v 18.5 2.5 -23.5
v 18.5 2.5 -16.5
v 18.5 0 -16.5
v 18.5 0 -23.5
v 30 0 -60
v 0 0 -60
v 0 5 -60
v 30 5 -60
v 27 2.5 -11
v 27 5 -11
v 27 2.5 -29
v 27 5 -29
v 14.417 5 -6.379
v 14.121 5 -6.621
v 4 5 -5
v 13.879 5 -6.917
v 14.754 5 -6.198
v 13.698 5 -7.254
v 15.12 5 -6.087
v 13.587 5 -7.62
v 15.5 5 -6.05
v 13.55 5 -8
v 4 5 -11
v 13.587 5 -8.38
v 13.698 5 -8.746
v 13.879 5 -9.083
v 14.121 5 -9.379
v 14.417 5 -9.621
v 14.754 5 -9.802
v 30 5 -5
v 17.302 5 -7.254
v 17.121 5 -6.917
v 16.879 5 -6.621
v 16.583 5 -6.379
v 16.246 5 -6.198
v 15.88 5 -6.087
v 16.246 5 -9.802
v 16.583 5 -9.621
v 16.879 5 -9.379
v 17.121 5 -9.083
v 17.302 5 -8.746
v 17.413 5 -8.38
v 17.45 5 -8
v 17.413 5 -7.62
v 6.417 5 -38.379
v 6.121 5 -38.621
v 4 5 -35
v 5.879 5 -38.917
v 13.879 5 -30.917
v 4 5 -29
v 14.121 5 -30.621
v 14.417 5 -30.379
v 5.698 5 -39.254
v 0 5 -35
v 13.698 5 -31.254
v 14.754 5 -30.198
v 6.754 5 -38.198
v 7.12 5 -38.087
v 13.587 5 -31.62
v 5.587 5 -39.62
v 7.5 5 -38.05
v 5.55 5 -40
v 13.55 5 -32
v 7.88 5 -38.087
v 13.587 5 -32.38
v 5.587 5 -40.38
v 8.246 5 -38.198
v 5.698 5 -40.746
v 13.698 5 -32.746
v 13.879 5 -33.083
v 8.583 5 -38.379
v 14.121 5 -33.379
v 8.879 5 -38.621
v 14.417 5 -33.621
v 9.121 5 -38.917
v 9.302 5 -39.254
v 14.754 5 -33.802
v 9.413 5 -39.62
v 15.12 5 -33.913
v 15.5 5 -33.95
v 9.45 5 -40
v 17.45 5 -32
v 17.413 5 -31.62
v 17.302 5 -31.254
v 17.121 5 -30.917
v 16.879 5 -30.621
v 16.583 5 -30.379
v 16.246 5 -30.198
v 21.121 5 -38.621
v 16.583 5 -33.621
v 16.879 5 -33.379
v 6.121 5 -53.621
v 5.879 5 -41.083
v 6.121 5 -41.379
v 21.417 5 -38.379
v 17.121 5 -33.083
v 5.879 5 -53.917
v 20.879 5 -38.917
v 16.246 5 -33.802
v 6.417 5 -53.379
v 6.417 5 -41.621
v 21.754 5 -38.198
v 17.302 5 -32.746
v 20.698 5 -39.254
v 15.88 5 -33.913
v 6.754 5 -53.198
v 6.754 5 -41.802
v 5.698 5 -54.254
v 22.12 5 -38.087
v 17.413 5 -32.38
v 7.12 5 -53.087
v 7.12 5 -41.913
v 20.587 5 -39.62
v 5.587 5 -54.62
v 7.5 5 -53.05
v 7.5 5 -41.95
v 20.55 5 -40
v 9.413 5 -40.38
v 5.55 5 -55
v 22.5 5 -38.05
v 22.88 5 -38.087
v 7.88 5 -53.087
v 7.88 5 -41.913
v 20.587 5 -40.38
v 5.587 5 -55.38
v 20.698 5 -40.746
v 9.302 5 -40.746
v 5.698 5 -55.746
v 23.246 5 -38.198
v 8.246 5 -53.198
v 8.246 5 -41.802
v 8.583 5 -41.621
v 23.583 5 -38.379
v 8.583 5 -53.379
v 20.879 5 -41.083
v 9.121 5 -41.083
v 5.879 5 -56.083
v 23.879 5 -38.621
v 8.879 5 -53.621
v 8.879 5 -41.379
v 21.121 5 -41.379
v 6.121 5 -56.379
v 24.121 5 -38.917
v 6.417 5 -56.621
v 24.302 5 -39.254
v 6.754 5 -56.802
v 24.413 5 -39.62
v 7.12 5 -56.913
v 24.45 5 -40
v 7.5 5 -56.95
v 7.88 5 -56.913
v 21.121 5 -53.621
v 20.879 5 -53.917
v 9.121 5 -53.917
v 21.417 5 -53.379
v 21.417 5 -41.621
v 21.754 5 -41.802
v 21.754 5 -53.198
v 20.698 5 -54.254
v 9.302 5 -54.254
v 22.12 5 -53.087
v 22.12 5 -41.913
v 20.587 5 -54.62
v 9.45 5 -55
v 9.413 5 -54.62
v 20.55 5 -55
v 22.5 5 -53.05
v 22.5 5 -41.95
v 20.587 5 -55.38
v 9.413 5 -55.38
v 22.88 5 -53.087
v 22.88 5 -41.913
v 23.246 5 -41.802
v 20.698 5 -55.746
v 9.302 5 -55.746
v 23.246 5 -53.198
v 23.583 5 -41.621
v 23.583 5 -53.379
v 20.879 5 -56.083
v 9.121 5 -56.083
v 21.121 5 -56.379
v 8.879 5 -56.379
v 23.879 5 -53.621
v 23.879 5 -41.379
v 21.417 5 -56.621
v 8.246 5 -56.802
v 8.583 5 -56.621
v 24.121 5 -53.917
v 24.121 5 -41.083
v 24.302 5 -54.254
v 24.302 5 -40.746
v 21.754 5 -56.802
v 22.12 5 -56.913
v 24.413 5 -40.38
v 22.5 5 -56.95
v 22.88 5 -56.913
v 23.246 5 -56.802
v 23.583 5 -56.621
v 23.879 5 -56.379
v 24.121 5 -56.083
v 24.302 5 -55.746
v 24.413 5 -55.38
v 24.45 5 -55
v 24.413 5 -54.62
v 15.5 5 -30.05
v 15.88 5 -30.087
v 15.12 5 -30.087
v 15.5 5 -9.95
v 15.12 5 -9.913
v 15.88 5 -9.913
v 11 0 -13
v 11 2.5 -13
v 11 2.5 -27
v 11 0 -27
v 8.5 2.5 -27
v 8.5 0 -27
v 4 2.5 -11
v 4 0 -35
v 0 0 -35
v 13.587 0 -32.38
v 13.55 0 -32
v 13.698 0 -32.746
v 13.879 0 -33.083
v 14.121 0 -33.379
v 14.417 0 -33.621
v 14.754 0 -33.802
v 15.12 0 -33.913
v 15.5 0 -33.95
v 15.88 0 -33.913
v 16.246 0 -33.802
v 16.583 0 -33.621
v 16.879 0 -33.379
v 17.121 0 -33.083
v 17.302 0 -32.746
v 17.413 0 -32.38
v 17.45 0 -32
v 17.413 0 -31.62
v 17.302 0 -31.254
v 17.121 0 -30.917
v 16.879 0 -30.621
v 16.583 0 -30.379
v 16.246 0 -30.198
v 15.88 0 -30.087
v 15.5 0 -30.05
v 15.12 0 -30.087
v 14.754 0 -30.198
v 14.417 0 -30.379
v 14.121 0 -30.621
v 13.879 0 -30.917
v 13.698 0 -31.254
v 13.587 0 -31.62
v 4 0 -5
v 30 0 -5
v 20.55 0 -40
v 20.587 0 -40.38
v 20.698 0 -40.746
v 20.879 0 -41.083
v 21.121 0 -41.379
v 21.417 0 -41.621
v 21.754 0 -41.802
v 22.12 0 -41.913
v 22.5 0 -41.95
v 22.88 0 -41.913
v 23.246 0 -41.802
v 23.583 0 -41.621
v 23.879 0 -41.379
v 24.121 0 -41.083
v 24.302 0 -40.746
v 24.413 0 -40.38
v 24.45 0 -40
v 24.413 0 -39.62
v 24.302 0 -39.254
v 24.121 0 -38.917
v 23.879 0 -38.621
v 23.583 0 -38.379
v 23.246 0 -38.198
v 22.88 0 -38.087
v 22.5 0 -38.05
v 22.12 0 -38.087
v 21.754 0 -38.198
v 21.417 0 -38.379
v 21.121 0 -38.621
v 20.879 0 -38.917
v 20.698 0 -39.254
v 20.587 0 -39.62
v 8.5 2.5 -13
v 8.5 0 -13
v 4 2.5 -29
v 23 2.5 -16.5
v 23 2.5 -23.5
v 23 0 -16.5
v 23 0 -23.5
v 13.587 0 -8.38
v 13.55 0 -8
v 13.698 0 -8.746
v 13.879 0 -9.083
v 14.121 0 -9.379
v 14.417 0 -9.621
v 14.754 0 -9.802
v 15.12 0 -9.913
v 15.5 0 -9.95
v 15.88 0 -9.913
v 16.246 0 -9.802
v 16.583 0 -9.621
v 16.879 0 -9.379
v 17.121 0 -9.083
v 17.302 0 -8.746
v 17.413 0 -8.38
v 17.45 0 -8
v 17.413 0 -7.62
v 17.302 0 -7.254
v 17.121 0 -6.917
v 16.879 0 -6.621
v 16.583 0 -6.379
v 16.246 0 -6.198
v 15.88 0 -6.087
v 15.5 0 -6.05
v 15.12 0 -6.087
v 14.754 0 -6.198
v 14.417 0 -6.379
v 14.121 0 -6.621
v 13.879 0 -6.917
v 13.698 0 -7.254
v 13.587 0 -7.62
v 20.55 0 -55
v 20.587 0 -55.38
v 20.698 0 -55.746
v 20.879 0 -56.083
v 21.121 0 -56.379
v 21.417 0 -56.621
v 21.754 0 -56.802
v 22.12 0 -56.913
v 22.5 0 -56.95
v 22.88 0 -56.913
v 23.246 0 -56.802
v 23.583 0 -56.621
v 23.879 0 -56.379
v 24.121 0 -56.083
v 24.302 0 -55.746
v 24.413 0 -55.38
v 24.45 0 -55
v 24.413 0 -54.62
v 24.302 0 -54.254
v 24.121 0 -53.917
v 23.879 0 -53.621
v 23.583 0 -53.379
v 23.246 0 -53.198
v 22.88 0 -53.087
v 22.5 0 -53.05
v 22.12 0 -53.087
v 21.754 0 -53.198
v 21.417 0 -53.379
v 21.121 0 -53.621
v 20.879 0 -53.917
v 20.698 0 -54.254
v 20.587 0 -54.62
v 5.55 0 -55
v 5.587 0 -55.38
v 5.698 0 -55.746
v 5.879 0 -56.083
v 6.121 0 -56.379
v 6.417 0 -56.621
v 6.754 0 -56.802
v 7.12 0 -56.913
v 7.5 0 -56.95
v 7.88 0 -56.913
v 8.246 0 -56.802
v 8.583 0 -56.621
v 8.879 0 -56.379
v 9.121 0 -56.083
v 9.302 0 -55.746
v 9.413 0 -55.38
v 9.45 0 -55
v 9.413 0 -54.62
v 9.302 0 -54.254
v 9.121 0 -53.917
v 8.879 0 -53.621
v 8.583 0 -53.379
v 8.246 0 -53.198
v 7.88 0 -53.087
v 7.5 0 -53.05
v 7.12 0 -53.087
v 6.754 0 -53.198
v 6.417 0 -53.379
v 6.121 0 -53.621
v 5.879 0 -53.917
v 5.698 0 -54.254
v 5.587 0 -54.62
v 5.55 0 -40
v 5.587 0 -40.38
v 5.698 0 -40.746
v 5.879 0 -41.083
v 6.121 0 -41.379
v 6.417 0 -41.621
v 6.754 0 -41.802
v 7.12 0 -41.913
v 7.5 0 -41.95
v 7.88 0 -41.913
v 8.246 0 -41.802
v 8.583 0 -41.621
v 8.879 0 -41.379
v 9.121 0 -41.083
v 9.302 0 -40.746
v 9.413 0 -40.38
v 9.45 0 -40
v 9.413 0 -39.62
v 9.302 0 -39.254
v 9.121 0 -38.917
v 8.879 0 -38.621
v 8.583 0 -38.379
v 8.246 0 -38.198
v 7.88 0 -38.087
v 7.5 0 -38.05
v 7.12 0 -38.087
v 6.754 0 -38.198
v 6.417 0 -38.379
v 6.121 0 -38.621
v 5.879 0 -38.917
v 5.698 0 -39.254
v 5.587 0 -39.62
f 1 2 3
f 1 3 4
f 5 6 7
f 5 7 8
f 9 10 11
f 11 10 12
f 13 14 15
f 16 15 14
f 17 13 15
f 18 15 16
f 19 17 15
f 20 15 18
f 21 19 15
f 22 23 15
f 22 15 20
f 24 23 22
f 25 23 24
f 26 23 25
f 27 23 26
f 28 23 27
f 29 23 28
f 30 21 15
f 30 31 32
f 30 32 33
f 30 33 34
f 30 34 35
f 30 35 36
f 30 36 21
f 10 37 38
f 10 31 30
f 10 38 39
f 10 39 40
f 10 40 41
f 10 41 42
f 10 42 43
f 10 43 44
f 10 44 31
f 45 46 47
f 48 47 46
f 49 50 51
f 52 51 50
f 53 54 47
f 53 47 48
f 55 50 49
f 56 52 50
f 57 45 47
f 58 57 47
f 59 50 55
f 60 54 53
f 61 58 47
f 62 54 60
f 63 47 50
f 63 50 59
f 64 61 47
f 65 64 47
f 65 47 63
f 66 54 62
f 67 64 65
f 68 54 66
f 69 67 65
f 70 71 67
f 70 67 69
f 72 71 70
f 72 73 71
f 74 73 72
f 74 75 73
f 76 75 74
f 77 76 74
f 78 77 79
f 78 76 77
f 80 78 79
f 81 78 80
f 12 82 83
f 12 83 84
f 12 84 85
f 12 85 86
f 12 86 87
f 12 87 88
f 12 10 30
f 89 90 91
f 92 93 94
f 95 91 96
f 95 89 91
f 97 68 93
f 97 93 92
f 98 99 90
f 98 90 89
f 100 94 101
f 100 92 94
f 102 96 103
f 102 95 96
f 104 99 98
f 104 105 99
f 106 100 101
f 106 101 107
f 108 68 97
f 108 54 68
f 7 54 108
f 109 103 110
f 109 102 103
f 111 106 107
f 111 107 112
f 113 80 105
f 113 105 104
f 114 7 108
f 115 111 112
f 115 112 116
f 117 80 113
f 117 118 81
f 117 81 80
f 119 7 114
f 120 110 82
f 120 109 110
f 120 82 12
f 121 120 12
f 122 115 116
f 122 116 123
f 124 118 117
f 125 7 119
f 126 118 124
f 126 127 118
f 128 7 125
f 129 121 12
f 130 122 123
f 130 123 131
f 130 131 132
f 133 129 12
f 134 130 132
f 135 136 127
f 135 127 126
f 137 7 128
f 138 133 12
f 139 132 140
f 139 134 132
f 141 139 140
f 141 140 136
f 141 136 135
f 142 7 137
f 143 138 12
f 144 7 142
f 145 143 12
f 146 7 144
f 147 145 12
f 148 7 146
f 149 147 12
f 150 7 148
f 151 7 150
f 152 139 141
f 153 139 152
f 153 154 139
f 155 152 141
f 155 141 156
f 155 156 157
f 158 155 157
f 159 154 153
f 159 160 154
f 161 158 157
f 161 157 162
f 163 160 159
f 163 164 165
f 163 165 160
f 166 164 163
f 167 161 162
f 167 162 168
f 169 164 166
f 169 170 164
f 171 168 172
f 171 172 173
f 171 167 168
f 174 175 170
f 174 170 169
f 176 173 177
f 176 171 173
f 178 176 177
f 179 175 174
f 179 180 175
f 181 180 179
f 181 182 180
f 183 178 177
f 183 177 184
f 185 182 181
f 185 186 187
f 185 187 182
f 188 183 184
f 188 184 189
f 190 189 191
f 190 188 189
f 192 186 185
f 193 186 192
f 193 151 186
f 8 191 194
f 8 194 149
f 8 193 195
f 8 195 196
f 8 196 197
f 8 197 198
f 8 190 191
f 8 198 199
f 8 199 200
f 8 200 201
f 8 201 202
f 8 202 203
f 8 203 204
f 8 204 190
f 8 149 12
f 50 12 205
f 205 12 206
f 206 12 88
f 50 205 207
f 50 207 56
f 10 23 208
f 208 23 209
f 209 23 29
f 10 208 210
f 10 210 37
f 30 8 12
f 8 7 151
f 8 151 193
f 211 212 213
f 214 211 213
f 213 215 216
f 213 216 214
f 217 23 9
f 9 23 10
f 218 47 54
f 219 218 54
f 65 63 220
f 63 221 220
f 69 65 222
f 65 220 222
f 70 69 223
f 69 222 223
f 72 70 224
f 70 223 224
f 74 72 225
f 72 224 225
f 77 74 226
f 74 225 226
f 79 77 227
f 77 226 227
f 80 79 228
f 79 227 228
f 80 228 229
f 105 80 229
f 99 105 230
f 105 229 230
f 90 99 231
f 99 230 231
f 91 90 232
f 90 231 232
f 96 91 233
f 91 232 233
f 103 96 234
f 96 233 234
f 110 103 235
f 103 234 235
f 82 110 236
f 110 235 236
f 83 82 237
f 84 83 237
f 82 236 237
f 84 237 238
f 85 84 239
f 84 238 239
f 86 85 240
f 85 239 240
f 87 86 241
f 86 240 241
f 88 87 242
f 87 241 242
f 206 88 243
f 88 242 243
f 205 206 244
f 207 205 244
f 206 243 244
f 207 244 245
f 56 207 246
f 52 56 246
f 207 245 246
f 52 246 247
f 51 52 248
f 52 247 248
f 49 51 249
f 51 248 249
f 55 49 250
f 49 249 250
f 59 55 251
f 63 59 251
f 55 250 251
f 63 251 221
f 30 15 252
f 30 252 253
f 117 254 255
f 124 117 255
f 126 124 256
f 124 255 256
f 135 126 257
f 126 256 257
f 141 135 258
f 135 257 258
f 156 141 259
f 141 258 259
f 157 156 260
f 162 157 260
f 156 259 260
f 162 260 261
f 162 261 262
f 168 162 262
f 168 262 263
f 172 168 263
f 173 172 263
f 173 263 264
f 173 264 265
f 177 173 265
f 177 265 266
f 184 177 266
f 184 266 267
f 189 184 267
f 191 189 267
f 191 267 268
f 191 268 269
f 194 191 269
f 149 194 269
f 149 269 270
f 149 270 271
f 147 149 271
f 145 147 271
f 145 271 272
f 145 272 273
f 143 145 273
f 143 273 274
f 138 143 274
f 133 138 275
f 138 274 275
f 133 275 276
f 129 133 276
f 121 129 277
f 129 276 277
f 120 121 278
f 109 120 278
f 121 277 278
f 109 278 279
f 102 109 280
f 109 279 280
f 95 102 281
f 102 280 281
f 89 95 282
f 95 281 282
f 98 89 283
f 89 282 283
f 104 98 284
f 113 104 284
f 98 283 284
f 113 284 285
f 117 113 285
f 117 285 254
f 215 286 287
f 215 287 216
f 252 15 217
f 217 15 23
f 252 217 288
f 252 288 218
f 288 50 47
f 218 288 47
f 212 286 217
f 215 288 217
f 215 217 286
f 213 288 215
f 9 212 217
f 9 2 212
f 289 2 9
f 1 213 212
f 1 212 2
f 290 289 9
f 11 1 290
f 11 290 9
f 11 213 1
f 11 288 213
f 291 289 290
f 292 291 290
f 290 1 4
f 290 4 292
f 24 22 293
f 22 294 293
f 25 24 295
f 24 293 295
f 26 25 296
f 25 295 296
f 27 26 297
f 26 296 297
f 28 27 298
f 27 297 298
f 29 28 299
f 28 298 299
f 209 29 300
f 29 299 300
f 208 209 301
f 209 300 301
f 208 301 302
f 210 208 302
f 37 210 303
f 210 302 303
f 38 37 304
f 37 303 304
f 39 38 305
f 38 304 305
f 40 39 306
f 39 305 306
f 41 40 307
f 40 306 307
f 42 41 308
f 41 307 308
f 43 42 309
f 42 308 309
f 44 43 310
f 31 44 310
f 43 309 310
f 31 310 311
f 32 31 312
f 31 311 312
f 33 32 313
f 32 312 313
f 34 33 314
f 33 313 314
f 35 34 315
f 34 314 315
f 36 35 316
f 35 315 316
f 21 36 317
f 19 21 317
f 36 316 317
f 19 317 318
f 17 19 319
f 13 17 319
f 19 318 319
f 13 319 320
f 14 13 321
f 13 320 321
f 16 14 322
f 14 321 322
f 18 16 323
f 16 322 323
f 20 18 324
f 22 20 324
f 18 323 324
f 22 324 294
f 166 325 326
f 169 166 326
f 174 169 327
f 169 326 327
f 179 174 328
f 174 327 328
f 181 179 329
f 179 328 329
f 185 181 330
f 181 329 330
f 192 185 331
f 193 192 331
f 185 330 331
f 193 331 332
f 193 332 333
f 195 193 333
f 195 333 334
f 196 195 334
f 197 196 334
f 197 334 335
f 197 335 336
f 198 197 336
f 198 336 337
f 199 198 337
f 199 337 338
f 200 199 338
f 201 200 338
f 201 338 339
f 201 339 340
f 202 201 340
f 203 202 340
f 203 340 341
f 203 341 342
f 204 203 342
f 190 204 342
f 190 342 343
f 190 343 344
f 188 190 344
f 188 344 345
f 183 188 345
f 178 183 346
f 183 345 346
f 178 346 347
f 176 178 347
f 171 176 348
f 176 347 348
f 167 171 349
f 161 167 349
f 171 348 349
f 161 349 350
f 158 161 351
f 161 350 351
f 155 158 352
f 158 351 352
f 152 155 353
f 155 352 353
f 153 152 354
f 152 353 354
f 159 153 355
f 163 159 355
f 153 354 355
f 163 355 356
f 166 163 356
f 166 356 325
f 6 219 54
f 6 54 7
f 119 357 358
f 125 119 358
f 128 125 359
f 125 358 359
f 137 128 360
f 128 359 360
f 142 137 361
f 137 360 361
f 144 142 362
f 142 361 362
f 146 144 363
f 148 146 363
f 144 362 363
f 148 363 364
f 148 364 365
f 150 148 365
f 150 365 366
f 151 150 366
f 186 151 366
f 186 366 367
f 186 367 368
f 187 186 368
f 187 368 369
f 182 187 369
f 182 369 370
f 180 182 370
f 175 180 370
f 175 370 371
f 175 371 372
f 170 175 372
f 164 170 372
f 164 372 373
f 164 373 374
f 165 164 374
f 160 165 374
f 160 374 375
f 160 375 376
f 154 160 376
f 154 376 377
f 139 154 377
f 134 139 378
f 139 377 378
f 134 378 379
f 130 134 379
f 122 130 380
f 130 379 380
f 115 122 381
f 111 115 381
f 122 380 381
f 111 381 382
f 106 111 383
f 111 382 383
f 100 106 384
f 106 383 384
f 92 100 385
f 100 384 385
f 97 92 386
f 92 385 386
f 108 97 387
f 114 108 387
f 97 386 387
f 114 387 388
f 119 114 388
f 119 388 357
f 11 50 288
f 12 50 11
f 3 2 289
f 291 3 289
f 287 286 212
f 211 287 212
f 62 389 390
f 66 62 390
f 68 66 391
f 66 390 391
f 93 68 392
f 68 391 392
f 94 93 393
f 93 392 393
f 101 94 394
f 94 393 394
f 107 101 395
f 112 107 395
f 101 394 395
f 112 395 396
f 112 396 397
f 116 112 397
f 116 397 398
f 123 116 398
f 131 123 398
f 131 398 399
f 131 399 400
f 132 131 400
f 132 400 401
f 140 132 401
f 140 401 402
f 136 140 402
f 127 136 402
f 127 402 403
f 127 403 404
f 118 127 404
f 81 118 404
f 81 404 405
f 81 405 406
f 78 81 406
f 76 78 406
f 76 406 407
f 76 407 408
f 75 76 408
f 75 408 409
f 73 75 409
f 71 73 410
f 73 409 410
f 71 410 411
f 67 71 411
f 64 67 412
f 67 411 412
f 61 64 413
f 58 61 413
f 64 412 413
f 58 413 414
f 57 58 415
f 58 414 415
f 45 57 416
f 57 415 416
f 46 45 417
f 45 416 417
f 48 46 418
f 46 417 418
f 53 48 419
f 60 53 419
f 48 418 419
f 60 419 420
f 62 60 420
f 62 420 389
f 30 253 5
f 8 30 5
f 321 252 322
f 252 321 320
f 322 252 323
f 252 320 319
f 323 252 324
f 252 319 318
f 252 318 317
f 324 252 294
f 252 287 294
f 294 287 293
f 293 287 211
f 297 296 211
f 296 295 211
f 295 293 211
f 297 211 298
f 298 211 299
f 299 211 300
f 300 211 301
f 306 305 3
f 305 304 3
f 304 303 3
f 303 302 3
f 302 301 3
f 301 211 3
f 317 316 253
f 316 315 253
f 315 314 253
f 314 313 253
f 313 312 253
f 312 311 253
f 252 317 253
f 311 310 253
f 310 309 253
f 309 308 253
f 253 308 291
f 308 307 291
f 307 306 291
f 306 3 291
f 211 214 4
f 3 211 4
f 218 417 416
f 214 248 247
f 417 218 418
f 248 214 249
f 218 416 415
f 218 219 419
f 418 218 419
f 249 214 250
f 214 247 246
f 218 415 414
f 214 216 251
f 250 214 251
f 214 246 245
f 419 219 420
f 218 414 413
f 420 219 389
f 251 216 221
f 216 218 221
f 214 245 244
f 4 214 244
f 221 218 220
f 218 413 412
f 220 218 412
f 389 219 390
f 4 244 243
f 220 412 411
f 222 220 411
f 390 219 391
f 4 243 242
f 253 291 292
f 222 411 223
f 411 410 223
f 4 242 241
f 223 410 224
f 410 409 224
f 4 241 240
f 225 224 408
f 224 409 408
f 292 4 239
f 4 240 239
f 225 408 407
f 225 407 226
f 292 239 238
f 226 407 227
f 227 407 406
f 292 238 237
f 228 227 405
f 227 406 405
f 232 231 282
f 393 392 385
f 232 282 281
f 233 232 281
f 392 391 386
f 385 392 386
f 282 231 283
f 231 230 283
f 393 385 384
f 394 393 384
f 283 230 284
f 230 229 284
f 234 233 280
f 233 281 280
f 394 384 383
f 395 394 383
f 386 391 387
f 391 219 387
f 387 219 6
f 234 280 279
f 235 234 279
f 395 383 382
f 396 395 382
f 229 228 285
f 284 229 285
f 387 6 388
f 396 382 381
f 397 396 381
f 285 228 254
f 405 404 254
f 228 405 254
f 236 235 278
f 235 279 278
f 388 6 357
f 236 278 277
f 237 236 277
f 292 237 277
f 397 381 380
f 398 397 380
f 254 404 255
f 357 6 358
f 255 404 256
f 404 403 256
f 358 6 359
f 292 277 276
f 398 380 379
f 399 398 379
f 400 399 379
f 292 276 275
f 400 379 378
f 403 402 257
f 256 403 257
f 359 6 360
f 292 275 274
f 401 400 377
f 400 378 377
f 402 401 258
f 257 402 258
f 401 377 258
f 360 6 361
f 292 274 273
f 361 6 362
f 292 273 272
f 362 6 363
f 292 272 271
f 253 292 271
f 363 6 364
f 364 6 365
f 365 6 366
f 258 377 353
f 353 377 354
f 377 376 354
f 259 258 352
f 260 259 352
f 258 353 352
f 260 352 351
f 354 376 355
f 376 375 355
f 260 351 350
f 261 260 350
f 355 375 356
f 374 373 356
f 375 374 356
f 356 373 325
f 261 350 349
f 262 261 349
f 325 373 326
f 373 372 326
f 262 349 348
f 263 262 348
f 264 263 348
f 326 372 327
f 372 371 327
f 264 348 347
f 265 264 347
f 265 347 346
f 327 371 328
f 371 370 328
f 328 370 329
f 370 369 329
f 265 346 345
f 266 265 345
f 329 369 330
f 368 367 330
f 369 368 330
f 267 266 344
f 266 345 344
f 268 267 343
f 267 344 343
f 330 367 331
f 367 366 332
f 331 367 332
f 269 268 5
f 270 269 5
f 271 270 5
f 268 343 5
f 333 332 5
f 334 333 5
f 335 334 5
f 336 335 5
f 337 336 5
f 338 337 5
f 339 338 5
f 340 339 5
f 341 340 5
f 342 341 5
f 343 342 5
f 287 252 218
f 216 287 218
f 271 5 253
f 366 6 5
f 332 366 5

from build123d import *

# Parameters (mm, degrees)
ESQUISSE1_W             = 30
ESQUISSE1_H             = 60
BOSS_EXTRU_1_DEPTH      = 5
D_GAGEMENT_M3_51_D      = 3.9
ESQUISSE19_W            = 26
ESQUISSE19_H            = 5
ENL_V_MAT_EXTRU_5_DEPTH = 6
D_GAGEMENT_M3_53_D      = 3.9
D_GAGEMENT_M3_53_DEPTH  = 5
D_GAGEMENT_M3_53_TIP    = 1.171678207
ESQUISSE22_W            = 23
ESQUISSE22_H            = 18
ENL_V_MAT_EXTRU_6_DEPTH = 2.5
ESQUISSE23_W            = 2.5
ESQUISSE23_H            = 14
ESQUISSE23_W_2          = 4.5
ESQUISSE23_H_2          = 7
ENL_V_MAT_EXTRU_7_DEPTH = 3.5


with BuildPart() as part:
    # Esquisse1 → Boss.-Extru.1 (new body)
    with BuildSketch(Plane(origin=(0, 0, 0), x_dir=(1, 0, 0), z_dir=(0, 1, 0))):
        with Locations((15, 30)):
            Rectangle(ESQUISSE1_W, ESQUISSE1_H)
    extrude(amount=BOSS_EXTRU_1_DEPTH)

    # Dégagement M3.51 (through all)
    with Locations(Plane(origin=(0, 5, 0), x_dir=(1, 0, 0), z_dir=(0, 1, 0))):
        with Locations((7.5, 40), (22.5, 40), (22.5, 55), (7.5, 55)):
            Hole(D_GAGEMENT_M3_51_D / 2)

    # Esquisse19 → Enlèv. mat.-Extru.5 (cut, through all)
    with BuildSketch(Plane(origin=(0, 5, 0), x_dir=(1, 0, 0), z_dir=(0, 1, 0))):
        Polygon((4, 5), (4, 35), (0, 35), (0, 0), (4, 0), align=None)
        with Locations((17, 2.5)):
            Rectangle(ESQUISSE19_W, ESQUISSE19_H)
    extrude(amount=-ENL_V_MAT_EXTRU_5_DEPTH, mode=Mode.SUBTRACT)

    # Dégagement M3.53
    with Locations(Plane(origin=(0, 5, 0), x_dir=(1, 0, 0), z_dir=(0, 1, 0))):
        with Locations((15.5, 32), (15.5, 8)):
            Hole(D_GAGEMENT_M3_53_D / 2, depth=D_GAGEMENT_M3_53_DEPTH)
            with Locations((0, 0, -(D_GAGEMENT_M3_53_DEPTH + D_GAGEMENT_M3_53_TIP / 2))):  # 118° drill point
                Cone(0, D_GAGEMENT_M3_53_D / 2, D_GAGEMENT_M3_53_TIP, mode=Mode.SUBTRACT)

    # Esquisse22 → Enlèv. mat.-Extru.6 (cut)
    with BuildSketch(Plane(origin=(0, 5, 0), x_dir=(1, 0, 0), z_dir=(0, 1, 0))):
        with Locations((15.5, 20)):
            Rectangle(ESQUISSE22_W, ESQUISSE22_H)
    extrude(amount=-ENL_V_MAT_EXTRU_6_DEPTH, mode=Mode.SUBTRACT)

    # Esquisse23 → Enlèv. mat.-Extru.7 (cut, through all)
    with BuildSketch(Plane(origin=(0, 2.5, 0), x_dir=(1, 0, 0), z_dir=(0, 1, 0))):
        with Locations((9.75, 20)):
            Rectangle(ESQUISSE23_W, ESQUISSE23_H)
        with Locations((20.75, 20)):
            Rectangle(ESQUISSE23_W_2, ESQUISSE23_H_2)
    extrude(amount=-ENL_V_MAT_EXTRU_7_DEPTH, mode=Mode.SUBTRACT)


solid = part.part
